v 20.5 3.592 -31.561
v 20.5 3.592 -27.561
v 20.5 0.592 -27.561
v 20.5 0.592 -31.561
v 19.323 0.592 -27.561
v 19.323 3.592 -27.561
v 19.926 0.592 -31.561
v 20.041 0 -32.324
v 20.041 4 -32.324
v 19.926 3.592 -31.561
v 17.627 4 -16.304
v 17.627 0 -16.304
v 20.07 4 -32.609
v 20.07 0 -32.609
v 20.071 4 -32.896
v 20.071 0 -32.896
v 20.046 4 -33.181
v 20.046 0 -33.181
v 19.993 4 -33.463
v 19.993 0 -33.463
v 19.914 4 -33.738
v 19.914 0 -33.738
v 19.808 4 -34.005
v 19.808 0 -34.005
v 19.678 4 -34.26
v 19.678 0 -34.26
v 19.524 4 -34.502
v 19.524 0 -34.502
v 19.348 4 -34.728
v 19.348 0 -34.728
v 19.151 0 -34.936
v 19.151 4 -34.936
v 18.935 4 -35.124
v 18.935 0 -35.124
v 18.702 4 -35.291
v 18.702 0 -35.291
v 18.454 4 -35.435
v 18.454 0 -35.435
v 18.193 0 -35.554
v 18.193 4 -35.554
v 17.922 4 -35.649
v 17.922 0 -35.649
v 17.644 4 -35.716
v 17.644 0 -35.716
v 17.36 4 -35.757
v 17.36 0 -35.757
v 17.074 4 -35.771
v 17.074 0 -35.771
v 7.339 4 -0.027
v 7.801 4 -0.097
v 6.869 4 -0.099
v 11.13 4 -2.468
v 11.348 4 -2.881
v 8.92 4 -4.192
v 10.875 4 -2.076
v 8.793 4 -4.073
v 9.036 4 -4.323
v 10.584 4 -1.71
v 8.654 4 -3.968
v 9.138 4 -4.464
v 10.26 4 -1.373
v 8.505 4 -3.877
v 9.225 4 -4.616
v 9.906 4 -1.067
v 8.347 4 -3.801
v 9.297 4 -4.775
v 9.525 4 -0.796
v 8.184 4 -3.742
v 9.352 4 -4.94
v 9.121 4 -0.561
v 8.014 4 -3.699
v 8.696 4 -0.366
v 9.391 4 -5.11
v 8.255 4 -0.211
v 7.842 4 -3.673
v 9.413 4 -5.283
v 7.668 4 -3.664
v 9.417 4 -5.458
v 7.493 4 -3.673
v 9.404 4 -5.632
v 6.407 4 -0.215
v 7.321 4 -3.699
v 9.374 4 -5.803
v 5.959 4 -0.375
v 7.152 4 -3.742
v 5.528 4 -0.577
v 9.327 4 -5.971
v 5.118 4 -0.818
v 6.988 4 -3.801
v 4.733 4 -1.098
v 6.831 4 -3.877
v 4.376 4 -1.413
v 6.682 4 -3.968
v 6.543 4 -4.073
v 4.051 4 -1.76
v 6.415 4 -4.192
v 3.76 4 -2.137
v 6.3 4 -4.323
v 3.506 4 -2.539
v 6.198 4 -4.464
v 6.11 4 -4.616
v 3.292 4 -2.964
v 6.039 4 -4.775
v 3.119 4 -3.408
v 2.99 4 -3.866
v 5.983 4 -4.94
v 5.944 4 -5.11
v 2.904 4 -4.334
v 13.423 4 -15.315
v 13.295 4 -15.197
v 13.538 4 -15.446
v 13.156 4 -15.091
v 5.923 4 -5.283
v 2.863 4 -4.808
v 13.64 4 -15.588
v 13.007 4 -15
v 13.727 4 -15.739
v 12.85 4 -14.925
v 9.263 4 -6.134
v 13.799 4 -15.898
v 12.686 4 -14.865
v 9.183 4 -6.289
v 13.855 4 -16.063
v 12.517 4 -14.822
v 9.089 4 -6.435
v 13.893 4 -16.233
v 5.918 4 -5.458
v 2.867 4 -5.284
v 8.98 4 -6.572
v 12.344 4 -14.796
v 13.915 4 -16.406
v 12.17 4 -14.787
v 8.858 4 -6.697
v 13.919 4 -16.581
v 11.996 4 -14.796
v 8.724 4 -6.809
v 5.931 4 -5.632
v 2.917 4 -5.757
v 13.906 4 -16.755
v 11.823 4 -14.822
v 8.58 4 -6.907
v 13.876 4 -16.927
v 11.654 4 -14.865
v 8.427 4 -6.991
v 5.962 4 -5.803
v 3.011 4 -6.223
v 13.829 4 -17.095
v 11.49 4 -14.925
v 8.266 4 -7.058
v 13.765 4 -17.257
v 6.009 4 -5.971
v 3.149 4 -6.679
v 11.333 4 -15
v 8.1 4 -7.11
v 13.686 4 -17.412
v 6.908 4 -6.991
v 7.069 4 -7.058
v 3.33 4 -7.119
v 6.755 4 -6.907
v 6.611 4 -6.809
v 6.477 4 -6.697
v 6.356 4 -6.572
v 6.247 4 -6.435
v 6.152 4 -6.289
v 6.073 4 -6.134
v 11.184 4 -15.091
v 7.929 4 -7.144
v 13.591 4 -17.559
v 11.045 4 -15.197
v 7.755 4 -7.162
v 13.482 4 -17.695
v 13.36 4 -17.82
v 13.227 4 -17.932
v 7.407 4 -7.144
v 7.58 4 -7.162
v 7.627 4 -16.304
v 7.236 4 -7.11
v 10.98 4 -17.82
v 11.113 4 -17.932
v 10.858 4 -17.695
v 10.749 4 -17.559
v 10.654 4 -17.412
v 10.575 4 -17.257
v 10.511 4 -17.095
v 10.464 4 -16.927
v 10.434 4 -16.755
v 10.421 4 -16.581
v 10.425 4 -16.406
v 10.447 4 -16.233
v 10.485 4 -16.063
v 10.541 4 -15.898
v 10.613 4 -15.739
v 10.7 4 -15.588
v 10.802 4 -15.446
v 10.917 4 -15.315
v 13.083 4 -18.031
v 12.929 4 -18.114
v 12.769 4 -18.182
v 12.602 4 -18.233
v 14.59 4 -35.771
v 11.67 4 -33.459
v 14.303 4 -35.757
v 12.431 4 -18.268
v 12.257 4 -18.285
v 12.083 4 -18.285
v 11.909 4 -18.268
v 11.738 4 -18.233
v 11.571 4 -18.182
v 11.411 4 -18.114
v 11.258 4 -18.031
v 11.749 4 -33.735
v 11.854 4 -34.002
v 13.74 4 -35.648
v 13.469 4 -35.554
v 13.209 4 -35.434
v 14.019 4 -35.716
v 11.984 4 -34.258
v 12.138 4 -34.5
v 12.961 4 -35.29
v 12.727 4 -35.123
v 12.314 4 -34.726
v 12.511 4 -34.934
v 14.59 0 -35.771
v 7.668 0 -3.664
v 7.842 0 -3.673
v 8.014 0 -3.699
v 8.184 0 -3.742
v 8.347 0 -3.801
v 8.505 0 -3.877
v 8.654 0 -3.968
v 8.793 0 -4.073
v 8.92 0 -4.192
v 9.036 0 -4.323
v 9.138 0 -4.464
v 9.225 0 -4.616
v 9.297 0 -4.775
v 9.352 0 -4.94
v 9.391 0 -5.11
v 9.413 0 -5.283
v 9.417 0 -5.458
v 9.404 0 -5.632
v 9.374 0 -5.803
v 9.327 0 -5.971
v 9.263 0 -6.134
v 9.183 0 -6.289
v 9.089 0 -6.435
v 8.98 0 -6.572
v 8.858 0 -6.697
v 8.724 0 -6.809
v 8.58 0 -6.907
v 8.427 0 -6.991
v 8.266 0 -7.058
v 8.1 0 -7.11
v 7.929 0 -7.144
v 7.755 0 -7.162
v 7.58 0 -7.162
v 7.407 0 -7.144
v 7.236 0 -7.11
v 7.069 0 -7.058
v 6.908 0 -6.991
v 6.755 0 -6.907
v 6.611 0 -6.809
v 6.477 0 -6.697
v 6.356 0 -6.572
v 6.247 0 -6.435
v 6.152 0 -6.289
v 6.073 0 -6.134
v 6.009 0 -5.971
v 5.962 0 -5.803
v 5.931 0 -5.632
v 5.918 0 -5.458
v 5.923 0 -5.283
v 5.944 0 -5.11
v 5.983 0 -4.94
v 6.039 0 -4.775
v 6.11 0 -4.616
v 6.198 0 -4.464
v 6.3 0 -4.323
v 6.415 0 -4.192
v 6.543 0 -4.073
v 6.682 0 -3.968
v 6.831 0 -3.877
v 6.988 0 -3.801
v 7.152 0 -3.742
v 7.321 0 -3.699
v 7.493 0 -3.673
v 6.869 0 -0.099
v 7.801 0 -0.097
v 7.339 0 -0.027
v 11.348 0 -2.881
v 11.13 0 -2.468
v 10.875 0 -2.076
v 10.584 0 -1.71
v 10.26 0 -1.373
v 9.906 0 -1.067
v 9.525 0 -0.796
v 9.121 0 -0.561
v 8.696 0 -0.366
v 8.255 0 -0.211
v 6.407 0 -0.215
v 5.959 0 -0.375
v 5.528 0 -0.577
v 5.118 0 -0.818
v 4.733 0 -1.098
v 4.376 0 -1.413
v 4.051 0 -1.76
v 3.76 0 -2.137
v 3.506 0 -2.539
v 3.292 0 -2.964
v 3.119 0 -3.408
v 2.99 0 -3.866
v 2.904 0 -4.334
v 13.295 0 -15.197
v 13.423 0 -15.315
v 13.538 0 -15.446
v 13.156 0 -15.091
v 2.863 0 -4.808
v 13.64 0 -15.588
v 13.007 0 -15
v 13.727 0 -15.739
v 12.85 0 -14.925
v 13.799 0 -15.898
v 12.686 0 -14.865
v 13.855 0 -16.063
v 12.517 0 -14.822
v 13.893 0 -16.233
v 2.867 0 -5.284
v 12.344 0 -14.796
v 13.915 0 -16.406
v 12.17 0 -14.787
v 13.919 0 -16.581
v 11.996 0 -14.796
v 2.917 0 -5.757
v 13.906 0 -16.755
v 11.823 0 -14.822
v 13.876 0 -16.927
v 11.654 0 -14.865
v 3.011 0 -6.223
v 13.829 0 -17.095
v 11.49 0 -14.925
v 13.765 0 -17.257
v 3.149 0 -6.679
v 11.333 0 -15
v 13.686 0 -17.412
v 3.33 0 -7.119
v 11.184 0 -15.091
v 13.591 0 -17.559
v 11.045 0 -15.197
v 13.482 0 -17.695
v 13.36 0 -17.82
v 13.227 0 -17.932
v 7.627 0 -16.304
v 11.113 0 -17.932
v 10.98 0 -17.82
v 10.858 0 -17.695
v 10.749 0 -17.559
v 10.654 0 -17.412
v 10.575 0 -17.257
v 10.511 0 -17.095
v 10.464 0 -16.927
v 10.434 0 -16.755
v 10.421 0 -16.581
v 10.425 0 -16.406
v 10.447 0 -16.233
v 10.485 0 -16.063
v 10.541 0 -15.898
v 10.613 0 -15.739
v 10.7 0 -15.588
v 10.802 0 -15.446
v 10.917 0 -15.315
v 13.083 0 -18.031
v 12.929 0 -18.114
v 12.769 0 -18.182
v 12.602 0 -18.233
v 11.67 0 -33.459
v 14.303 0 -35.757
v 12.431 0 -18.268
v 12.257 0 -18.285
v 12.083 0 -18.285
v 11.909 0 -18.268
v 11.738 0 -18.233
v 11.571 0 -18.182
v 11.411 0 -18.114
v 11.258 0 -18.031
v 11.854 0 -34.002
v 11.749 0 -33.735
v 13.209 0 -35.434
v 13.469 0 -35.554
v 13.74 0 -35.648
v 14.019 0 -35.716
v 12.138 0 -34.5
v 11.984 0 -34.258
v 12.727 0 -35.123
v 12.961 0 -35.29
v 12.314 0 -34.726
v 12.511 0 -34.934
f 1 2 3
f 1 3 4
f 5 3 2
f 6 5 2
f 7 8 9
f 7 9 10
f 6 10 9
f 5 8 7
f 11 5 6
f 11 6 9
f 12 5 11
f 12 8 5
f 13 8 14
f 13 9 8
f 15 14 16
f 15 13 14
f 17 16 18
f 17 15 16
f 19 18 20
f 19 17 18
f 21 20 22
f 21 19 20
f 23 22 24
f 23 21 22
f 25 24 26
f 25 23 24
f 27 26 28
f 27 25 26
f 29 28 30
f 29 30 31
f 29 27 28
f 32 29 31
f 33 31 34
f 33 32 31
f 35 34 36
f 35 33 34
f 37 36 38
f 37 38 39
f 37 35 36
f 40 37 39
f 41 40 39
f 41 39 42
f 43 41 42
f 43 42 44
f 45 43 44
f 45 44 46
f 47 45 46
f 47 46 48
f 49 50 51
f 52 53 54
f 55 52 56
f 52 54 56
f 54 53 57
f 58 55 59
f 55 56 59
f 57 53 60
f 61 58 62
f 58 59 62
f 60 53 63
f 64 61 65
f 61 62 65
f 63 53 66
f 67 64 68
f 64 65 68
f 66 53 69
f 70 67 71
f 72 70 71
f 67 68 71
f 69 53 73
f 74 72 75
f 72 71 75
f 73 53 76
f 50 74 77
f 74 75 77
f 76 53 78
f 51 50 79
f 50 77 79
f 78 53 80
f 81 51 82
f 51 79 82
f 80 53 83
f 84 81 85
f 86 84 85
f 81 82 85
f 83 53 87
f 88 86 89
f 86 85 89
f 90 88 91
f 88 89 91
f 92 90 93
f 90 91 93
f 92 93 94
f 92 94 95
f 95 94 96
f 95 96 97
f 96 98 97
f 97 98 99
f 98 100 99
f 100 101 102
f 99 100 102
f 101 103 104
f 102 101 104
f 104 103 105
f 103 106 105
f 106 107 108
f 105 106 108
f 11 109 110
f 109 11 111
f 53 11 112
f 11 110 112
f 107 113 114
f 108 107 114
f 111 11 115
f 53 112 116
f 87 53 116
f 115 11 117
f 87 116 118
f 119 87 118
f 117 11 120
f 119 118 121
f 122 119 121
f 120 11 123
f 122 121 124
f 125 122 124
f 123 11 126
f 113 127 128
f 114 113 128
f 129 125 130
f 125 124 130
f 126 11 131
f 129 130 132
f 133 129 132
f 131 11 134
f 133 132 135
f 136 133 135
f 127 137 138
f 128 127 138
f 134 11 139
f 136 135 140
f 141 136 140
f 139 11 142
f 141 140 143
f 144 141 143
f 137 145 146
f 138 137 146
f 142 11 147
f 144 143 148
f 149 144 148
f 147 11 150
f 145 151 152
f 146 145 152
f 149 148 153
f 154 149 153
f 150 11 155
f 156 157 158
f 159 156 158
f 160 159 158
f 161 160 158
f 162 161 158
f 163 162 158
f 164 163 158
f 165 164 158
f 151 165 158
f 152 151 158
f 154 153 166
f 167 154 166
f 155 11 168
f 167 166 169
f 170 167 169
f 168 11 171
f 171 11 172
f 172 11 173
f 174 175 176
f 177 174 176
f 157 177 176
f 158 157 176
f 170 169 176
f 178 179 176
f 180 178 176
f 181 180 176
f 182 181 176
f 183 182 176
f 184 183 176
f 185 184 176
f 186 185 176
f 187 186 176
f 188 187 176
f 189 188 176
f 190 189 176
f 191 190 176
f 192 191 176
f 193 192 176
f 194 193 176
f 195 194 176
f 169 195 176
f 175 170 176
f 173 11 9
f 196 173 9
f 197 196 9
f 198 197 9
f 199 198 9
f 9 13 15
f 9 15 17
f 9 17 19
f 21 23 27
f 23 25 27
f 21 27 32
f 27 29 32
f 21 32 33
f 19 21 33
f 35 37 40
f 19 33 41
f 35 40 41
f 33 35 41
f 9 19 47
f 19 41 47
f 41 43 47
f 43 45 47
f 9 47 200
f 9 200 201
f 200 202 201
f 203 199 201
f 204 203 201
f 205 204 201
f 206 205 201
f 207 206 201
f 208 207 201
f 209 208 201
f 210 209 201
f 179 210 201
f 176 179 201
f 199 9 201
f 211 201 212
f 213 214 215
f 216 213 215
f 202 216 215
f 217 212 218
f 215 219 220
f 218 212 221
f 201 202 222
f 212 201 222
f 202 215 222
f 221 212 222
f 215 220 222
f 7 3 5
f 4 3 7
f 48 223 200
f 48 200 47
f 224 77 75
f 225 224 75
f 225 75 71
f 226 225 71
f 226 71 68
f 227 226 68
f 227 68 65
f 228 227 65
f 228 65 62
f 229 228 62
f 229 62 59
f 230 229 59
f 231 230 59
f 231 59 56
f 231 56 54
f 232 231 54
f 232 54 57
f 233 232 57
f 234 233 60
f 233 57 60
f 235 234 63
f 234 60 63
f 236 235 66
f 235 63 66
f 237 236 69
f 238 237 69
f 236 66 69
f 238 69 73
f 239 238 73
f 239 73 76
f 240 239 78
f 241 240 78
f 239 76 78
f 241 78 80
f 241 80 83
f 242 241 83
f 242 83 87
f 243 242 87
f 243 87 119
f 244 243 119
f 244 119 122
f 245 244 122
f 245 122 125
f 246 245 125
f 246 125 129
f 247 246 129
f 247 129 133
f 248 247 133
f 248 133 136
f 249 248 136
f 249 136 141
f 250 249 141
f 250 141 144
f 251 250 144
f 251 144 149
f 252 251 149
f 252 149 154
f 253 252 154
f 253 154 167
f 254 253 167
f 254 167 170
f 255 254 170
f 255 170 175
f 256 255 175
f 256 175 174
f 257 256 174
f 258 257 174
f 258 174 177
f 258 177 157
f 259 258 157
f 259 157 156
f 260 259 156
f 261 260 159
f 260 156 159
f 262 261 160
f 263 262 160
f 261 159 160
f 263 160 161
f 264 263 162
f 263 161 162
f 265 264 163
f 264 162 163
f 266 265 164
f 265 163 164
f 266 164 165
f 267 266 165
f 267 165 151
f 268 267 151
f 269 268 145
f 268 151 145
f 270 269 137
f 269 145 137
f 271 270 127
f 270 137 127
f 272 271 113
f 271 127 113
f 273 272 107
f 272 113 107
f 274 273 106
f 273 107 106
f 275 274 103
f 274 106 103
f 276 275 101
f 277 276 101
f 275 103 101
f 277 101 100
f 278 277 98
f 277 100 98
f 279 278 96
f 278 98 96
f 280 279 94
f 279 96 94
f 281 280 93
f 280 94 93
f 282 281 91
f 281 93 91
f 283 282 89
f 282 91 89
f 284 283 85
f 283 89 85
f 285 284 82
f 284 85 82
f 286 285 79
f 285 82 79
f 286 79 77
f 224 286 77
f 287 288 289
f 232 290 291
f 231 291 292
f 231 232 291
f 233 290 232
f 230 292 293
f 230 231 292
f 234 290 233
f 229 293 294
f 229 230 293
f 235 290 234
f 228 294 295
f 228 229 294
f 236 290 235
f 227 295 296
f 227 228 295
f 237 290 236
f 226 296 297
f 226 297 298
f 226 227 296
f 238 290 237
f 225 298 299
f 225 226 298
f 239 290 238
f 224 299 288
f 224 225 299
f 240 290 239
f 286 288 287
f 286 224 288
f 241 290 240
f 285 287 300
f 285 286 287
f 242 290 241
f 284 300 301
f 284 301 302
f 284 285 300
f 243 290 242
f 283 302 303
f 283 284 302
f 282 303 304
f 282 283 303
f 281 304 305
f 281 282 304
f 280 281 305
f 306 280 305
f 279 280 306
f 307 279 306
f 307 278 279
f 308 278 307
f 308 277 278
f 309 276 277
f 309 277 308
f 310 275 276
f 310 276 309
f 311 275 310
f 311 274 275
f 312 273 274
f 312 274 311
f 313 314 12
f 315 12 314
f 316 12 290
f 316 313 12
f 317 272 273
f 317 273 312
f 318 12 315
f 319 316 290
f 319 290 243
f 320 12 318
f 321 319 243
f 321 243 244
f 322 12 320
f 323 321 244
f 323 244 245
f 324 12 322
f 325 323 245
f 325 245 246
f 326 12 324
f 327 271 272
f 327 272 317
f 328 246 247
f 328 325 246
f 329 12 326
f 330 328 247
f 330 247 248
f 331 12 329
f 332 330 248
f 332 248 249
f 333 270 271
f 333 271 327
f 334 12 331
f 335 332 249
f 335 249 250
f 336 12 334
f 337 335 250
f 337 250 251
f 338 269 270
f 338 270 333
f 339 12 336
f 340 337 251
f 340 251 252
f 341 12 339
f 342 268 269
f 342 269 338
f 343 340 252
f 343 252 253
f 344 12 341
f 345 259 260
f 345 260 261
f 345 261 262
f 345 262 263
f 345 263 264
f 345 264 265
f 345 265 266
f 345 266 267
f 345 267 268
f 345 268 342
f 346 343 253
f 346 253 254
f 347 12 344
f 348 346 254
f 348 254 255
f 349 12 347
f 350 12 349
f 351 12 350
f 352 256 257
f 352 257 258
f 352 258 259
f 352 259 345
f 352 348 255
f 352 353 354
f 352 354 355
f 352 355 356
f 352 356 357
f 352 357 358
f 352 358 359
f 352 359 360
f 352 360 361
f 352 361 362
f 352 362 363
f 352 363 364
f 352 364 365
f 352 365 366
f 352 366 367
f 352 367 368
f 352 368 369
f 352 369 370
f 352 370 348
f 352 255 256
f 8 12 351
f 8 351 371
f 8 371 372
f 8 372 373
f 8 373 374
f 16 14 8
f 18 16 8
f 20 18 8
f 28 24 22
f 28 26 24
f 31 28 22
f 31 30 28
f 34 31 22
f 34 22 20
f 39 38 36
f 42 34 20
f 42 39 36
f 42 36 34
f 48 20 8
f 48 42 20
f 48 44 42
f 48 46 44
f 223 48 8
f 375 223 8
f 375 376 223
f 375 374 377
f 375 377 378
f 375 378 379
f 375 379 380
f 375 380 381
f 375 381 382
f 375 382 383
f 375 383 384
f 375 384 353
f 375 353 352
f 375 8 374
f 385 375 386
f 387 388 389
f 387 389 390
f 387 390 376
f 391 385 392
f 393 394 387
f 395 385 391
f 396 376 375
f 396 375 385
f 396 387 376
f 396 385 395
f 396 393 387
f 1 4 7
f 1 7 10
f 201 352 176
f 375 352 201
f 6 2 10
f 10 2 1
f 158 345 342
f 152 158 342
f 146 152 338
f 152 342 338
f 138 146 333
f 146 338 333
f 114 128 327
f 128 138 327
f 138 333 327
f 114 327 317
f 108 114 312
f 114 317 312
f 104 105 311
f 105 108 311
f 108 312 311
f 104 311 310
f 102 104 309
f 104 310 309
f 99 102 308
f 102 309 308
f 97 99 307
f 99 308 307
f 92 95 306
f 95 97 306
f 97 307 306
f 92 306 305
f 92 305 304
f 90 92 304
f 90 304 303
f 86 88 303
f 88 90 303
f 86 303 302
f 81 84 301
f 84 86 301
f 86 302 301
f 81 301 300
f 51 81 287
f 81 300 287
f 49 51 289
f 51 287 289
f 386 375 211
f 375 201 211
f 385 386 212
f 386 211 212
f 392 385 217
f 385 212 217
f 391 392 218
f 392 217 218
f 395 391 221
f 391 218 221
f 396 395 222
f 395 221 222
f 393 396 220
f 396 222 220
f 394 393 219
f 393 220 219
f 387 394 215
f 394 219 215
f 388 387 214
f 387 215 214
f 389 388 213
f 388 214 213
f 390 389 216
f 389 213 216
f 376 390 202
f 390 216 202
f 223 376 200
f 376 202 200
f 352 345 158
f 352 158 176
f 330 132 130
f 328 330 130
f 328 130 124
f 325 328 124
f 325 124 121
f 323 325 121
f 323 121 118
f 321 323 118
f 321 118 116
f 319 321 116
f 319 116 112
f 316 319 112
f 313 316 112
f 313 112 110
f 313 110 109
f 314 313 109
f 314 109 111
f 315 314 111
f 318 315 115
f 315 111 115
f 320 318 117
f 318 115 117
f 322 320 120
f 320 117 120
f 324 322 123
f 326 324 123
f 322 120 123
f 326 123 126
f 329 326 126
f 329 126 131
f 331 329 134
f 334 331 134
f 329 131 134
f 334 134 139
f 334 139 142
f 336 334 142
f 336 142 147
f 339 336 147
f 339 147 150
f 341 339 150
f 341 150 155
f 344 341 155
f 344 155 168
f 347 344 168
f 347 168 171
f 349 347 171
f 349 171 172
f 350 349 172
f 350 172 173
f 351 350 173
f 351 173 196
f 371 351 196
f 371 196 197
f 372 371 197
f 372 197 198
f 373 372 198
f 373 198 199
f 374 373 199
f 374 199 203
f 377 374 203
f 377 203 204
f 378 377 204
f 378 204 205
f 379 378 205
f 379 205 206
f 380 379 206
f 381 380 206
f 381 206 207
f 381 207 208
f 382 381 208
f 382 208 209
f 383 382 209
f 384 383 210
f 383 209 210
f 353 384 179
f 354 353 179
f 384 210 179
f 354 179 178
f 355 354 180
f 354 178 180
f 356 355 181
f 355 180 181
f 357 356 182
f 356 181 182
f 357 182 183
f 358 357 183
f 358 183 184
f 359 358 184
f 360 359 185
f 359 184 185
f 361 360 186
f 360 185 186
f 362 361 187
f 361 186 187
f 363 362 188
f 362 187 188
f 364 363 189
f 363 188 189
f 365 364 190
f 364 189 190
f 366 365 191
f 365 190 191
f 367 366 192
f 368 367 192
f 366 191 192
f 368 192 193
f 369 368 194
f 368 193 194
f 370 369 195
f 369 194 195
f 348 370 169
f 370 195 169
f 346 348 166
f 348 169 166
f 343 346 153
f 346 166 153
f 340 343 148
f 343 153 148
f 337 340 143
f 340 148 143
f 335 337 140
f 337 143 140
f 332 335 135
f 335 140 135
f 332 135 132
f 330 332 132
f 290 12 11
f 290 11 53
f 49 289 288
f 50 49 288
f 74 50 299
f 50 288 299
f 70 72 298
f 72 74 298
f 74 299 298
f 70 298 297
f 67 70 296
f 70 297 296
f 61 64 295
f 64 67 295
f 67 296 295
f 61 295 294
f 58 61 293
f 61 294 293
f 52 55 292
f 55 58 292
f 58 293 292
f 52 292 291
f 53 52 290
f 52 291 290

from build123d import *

# Parameters (mm, degrees)
BOSS_EXTRUDE1_DEPTH = 4
FILLET1_R           = 5
FILLET2_R           = 3
SKETCH2_R           = 1.75
CUT_EXTRUDE1_DEPTH  = 42.213228115
BOSS_EXTRUDE2_REACH = 42.084
SKETCH4_W           = 4
SKETCH4_H           = 3


with BuildPart() as part:
    # Sketch1 → Boss-Extrude1 (new body)
    with BuildSketch(Plane(origin=(0, 0, 0), x_dir=(1, 0, 0), z_dir=(0, 1, 0))):
        Polygon((0, 0), (7.627319971, 16.304109607), (12.214275277, 35.771000499), (20.559764671, 35.771000499), (17.627319971, 16.304109607), (10, 0), align=None)
    extrude(amount=BOSS_EXTRUDE1_DEPTH)

    # Fillet1
    # the kernel refuses this fillet: 5 mm, written as the material it takes off along each edge
    with BuildSketch(Plane(origin=(10, -7.952504215, 0), x_dir=(0.42373999836860227, 0, -0.9057838670359375), z_dir=(0, 1, 0))) as fillet1_piece_1:
        with BuildLine():
            CenterArc((FILLET1_R * 0.636200337192, FILLET1_R), FILLET1_R, 205.070935448, 64.929064552)
            Line((-FILLET1_R * 0.269583529844, FILLET1_R * 0.576260001631), (0, 0))
            Line((0, 0), (FILLET1_R * 0.636200337192, 0))
        make_face()
    extrude(amount=19.90500843, mode=Mode.SUBTRACT)
    with BuildSketch(Plane(origin=(0, -19.647899049, 0), x_dir=(0.42373999836860193, 0, -0.9057838670359376), z_dir=(0, 1, 0))) as fillet1_piece_2:
        with BuildLine():
            CenterArc((FILLET1_R * 1.57183192391, -FILLET1_R), FILLET1_R, 90, 115.070935448)
            Line((FILLET1_R * 0.666048056873, -FILLET1_R * 1.42373999837), (0, 0))
            Line((0, 0), (FILLET1_R * 1.57183192391, 0))
        make_face()
    extrude(amount=43.295798098, mode=Mode.SUBTRACT)

    # Fillet2
    fillet2_edges = [part.edges().sort_by_distance(p)[0] for p in [
        (12.214275277, 2, -35.771000499),
        (20.559764671, 2, -35.771000499),
    ]]
    fillet(fillet2_edges, radius=FILLET2_R)

    # Sketch2 → Cut-Extrude1 (cut, through all)
    with BuildSketch(Plane(origin=(0, 4, 0), x_dir=(1, 0, 0), z_dir=(0, 1, 0))):
        with Locations(Location((7.667711585, 5.413915862, 0), (0, 0, 270))):
            Circle(SKETCH2_R)
        with Locations(Location((12.170024678, 16.537277621, 0), (0, 0, 270))):
            Circle(SKETCH2_R)
    extrude(amount=-CUT_EXTRUDE1_DEPTH, mode=Mode.SUBTRACT)

    # Boss-Extrude2: up to this plane
    boss_extrude2_end = Plane(origin=(17.627319971, 4, -16.304109607), z_dir=(-0.9888436763539994, 0, -0.1489569861896618))
    # Sketch4 → Boss-Extrude2 (add, up to the surface)
    with BuildSketch(Plane(origin=(20.5, 0, 0), x_dir=(0, 0, -1), z_dir=(1, 0, 0)), mode=Mode.PRIVATE) as boss_extrude2_sk1:
        with Locations((29.561107497, 2.091926215)):
            Rectangle(SKETCH4_W, SKETCH4_H)
    boss_extrude2_tool1 = split(extrude(boss_extrude2_sk1.sketch, amount=-BOSS_EXTRUDE2_REACH, mode=Mode.PRIVATE), bisect_by=boss_extrude2_end, keep=Keep.BOTH, mode=Mode.PRIVATE)
    add(boss_extrude2_tool1.solids().sort_by_distance((20.5, 2.091926, -29.561107))[0])


solid = part.part
